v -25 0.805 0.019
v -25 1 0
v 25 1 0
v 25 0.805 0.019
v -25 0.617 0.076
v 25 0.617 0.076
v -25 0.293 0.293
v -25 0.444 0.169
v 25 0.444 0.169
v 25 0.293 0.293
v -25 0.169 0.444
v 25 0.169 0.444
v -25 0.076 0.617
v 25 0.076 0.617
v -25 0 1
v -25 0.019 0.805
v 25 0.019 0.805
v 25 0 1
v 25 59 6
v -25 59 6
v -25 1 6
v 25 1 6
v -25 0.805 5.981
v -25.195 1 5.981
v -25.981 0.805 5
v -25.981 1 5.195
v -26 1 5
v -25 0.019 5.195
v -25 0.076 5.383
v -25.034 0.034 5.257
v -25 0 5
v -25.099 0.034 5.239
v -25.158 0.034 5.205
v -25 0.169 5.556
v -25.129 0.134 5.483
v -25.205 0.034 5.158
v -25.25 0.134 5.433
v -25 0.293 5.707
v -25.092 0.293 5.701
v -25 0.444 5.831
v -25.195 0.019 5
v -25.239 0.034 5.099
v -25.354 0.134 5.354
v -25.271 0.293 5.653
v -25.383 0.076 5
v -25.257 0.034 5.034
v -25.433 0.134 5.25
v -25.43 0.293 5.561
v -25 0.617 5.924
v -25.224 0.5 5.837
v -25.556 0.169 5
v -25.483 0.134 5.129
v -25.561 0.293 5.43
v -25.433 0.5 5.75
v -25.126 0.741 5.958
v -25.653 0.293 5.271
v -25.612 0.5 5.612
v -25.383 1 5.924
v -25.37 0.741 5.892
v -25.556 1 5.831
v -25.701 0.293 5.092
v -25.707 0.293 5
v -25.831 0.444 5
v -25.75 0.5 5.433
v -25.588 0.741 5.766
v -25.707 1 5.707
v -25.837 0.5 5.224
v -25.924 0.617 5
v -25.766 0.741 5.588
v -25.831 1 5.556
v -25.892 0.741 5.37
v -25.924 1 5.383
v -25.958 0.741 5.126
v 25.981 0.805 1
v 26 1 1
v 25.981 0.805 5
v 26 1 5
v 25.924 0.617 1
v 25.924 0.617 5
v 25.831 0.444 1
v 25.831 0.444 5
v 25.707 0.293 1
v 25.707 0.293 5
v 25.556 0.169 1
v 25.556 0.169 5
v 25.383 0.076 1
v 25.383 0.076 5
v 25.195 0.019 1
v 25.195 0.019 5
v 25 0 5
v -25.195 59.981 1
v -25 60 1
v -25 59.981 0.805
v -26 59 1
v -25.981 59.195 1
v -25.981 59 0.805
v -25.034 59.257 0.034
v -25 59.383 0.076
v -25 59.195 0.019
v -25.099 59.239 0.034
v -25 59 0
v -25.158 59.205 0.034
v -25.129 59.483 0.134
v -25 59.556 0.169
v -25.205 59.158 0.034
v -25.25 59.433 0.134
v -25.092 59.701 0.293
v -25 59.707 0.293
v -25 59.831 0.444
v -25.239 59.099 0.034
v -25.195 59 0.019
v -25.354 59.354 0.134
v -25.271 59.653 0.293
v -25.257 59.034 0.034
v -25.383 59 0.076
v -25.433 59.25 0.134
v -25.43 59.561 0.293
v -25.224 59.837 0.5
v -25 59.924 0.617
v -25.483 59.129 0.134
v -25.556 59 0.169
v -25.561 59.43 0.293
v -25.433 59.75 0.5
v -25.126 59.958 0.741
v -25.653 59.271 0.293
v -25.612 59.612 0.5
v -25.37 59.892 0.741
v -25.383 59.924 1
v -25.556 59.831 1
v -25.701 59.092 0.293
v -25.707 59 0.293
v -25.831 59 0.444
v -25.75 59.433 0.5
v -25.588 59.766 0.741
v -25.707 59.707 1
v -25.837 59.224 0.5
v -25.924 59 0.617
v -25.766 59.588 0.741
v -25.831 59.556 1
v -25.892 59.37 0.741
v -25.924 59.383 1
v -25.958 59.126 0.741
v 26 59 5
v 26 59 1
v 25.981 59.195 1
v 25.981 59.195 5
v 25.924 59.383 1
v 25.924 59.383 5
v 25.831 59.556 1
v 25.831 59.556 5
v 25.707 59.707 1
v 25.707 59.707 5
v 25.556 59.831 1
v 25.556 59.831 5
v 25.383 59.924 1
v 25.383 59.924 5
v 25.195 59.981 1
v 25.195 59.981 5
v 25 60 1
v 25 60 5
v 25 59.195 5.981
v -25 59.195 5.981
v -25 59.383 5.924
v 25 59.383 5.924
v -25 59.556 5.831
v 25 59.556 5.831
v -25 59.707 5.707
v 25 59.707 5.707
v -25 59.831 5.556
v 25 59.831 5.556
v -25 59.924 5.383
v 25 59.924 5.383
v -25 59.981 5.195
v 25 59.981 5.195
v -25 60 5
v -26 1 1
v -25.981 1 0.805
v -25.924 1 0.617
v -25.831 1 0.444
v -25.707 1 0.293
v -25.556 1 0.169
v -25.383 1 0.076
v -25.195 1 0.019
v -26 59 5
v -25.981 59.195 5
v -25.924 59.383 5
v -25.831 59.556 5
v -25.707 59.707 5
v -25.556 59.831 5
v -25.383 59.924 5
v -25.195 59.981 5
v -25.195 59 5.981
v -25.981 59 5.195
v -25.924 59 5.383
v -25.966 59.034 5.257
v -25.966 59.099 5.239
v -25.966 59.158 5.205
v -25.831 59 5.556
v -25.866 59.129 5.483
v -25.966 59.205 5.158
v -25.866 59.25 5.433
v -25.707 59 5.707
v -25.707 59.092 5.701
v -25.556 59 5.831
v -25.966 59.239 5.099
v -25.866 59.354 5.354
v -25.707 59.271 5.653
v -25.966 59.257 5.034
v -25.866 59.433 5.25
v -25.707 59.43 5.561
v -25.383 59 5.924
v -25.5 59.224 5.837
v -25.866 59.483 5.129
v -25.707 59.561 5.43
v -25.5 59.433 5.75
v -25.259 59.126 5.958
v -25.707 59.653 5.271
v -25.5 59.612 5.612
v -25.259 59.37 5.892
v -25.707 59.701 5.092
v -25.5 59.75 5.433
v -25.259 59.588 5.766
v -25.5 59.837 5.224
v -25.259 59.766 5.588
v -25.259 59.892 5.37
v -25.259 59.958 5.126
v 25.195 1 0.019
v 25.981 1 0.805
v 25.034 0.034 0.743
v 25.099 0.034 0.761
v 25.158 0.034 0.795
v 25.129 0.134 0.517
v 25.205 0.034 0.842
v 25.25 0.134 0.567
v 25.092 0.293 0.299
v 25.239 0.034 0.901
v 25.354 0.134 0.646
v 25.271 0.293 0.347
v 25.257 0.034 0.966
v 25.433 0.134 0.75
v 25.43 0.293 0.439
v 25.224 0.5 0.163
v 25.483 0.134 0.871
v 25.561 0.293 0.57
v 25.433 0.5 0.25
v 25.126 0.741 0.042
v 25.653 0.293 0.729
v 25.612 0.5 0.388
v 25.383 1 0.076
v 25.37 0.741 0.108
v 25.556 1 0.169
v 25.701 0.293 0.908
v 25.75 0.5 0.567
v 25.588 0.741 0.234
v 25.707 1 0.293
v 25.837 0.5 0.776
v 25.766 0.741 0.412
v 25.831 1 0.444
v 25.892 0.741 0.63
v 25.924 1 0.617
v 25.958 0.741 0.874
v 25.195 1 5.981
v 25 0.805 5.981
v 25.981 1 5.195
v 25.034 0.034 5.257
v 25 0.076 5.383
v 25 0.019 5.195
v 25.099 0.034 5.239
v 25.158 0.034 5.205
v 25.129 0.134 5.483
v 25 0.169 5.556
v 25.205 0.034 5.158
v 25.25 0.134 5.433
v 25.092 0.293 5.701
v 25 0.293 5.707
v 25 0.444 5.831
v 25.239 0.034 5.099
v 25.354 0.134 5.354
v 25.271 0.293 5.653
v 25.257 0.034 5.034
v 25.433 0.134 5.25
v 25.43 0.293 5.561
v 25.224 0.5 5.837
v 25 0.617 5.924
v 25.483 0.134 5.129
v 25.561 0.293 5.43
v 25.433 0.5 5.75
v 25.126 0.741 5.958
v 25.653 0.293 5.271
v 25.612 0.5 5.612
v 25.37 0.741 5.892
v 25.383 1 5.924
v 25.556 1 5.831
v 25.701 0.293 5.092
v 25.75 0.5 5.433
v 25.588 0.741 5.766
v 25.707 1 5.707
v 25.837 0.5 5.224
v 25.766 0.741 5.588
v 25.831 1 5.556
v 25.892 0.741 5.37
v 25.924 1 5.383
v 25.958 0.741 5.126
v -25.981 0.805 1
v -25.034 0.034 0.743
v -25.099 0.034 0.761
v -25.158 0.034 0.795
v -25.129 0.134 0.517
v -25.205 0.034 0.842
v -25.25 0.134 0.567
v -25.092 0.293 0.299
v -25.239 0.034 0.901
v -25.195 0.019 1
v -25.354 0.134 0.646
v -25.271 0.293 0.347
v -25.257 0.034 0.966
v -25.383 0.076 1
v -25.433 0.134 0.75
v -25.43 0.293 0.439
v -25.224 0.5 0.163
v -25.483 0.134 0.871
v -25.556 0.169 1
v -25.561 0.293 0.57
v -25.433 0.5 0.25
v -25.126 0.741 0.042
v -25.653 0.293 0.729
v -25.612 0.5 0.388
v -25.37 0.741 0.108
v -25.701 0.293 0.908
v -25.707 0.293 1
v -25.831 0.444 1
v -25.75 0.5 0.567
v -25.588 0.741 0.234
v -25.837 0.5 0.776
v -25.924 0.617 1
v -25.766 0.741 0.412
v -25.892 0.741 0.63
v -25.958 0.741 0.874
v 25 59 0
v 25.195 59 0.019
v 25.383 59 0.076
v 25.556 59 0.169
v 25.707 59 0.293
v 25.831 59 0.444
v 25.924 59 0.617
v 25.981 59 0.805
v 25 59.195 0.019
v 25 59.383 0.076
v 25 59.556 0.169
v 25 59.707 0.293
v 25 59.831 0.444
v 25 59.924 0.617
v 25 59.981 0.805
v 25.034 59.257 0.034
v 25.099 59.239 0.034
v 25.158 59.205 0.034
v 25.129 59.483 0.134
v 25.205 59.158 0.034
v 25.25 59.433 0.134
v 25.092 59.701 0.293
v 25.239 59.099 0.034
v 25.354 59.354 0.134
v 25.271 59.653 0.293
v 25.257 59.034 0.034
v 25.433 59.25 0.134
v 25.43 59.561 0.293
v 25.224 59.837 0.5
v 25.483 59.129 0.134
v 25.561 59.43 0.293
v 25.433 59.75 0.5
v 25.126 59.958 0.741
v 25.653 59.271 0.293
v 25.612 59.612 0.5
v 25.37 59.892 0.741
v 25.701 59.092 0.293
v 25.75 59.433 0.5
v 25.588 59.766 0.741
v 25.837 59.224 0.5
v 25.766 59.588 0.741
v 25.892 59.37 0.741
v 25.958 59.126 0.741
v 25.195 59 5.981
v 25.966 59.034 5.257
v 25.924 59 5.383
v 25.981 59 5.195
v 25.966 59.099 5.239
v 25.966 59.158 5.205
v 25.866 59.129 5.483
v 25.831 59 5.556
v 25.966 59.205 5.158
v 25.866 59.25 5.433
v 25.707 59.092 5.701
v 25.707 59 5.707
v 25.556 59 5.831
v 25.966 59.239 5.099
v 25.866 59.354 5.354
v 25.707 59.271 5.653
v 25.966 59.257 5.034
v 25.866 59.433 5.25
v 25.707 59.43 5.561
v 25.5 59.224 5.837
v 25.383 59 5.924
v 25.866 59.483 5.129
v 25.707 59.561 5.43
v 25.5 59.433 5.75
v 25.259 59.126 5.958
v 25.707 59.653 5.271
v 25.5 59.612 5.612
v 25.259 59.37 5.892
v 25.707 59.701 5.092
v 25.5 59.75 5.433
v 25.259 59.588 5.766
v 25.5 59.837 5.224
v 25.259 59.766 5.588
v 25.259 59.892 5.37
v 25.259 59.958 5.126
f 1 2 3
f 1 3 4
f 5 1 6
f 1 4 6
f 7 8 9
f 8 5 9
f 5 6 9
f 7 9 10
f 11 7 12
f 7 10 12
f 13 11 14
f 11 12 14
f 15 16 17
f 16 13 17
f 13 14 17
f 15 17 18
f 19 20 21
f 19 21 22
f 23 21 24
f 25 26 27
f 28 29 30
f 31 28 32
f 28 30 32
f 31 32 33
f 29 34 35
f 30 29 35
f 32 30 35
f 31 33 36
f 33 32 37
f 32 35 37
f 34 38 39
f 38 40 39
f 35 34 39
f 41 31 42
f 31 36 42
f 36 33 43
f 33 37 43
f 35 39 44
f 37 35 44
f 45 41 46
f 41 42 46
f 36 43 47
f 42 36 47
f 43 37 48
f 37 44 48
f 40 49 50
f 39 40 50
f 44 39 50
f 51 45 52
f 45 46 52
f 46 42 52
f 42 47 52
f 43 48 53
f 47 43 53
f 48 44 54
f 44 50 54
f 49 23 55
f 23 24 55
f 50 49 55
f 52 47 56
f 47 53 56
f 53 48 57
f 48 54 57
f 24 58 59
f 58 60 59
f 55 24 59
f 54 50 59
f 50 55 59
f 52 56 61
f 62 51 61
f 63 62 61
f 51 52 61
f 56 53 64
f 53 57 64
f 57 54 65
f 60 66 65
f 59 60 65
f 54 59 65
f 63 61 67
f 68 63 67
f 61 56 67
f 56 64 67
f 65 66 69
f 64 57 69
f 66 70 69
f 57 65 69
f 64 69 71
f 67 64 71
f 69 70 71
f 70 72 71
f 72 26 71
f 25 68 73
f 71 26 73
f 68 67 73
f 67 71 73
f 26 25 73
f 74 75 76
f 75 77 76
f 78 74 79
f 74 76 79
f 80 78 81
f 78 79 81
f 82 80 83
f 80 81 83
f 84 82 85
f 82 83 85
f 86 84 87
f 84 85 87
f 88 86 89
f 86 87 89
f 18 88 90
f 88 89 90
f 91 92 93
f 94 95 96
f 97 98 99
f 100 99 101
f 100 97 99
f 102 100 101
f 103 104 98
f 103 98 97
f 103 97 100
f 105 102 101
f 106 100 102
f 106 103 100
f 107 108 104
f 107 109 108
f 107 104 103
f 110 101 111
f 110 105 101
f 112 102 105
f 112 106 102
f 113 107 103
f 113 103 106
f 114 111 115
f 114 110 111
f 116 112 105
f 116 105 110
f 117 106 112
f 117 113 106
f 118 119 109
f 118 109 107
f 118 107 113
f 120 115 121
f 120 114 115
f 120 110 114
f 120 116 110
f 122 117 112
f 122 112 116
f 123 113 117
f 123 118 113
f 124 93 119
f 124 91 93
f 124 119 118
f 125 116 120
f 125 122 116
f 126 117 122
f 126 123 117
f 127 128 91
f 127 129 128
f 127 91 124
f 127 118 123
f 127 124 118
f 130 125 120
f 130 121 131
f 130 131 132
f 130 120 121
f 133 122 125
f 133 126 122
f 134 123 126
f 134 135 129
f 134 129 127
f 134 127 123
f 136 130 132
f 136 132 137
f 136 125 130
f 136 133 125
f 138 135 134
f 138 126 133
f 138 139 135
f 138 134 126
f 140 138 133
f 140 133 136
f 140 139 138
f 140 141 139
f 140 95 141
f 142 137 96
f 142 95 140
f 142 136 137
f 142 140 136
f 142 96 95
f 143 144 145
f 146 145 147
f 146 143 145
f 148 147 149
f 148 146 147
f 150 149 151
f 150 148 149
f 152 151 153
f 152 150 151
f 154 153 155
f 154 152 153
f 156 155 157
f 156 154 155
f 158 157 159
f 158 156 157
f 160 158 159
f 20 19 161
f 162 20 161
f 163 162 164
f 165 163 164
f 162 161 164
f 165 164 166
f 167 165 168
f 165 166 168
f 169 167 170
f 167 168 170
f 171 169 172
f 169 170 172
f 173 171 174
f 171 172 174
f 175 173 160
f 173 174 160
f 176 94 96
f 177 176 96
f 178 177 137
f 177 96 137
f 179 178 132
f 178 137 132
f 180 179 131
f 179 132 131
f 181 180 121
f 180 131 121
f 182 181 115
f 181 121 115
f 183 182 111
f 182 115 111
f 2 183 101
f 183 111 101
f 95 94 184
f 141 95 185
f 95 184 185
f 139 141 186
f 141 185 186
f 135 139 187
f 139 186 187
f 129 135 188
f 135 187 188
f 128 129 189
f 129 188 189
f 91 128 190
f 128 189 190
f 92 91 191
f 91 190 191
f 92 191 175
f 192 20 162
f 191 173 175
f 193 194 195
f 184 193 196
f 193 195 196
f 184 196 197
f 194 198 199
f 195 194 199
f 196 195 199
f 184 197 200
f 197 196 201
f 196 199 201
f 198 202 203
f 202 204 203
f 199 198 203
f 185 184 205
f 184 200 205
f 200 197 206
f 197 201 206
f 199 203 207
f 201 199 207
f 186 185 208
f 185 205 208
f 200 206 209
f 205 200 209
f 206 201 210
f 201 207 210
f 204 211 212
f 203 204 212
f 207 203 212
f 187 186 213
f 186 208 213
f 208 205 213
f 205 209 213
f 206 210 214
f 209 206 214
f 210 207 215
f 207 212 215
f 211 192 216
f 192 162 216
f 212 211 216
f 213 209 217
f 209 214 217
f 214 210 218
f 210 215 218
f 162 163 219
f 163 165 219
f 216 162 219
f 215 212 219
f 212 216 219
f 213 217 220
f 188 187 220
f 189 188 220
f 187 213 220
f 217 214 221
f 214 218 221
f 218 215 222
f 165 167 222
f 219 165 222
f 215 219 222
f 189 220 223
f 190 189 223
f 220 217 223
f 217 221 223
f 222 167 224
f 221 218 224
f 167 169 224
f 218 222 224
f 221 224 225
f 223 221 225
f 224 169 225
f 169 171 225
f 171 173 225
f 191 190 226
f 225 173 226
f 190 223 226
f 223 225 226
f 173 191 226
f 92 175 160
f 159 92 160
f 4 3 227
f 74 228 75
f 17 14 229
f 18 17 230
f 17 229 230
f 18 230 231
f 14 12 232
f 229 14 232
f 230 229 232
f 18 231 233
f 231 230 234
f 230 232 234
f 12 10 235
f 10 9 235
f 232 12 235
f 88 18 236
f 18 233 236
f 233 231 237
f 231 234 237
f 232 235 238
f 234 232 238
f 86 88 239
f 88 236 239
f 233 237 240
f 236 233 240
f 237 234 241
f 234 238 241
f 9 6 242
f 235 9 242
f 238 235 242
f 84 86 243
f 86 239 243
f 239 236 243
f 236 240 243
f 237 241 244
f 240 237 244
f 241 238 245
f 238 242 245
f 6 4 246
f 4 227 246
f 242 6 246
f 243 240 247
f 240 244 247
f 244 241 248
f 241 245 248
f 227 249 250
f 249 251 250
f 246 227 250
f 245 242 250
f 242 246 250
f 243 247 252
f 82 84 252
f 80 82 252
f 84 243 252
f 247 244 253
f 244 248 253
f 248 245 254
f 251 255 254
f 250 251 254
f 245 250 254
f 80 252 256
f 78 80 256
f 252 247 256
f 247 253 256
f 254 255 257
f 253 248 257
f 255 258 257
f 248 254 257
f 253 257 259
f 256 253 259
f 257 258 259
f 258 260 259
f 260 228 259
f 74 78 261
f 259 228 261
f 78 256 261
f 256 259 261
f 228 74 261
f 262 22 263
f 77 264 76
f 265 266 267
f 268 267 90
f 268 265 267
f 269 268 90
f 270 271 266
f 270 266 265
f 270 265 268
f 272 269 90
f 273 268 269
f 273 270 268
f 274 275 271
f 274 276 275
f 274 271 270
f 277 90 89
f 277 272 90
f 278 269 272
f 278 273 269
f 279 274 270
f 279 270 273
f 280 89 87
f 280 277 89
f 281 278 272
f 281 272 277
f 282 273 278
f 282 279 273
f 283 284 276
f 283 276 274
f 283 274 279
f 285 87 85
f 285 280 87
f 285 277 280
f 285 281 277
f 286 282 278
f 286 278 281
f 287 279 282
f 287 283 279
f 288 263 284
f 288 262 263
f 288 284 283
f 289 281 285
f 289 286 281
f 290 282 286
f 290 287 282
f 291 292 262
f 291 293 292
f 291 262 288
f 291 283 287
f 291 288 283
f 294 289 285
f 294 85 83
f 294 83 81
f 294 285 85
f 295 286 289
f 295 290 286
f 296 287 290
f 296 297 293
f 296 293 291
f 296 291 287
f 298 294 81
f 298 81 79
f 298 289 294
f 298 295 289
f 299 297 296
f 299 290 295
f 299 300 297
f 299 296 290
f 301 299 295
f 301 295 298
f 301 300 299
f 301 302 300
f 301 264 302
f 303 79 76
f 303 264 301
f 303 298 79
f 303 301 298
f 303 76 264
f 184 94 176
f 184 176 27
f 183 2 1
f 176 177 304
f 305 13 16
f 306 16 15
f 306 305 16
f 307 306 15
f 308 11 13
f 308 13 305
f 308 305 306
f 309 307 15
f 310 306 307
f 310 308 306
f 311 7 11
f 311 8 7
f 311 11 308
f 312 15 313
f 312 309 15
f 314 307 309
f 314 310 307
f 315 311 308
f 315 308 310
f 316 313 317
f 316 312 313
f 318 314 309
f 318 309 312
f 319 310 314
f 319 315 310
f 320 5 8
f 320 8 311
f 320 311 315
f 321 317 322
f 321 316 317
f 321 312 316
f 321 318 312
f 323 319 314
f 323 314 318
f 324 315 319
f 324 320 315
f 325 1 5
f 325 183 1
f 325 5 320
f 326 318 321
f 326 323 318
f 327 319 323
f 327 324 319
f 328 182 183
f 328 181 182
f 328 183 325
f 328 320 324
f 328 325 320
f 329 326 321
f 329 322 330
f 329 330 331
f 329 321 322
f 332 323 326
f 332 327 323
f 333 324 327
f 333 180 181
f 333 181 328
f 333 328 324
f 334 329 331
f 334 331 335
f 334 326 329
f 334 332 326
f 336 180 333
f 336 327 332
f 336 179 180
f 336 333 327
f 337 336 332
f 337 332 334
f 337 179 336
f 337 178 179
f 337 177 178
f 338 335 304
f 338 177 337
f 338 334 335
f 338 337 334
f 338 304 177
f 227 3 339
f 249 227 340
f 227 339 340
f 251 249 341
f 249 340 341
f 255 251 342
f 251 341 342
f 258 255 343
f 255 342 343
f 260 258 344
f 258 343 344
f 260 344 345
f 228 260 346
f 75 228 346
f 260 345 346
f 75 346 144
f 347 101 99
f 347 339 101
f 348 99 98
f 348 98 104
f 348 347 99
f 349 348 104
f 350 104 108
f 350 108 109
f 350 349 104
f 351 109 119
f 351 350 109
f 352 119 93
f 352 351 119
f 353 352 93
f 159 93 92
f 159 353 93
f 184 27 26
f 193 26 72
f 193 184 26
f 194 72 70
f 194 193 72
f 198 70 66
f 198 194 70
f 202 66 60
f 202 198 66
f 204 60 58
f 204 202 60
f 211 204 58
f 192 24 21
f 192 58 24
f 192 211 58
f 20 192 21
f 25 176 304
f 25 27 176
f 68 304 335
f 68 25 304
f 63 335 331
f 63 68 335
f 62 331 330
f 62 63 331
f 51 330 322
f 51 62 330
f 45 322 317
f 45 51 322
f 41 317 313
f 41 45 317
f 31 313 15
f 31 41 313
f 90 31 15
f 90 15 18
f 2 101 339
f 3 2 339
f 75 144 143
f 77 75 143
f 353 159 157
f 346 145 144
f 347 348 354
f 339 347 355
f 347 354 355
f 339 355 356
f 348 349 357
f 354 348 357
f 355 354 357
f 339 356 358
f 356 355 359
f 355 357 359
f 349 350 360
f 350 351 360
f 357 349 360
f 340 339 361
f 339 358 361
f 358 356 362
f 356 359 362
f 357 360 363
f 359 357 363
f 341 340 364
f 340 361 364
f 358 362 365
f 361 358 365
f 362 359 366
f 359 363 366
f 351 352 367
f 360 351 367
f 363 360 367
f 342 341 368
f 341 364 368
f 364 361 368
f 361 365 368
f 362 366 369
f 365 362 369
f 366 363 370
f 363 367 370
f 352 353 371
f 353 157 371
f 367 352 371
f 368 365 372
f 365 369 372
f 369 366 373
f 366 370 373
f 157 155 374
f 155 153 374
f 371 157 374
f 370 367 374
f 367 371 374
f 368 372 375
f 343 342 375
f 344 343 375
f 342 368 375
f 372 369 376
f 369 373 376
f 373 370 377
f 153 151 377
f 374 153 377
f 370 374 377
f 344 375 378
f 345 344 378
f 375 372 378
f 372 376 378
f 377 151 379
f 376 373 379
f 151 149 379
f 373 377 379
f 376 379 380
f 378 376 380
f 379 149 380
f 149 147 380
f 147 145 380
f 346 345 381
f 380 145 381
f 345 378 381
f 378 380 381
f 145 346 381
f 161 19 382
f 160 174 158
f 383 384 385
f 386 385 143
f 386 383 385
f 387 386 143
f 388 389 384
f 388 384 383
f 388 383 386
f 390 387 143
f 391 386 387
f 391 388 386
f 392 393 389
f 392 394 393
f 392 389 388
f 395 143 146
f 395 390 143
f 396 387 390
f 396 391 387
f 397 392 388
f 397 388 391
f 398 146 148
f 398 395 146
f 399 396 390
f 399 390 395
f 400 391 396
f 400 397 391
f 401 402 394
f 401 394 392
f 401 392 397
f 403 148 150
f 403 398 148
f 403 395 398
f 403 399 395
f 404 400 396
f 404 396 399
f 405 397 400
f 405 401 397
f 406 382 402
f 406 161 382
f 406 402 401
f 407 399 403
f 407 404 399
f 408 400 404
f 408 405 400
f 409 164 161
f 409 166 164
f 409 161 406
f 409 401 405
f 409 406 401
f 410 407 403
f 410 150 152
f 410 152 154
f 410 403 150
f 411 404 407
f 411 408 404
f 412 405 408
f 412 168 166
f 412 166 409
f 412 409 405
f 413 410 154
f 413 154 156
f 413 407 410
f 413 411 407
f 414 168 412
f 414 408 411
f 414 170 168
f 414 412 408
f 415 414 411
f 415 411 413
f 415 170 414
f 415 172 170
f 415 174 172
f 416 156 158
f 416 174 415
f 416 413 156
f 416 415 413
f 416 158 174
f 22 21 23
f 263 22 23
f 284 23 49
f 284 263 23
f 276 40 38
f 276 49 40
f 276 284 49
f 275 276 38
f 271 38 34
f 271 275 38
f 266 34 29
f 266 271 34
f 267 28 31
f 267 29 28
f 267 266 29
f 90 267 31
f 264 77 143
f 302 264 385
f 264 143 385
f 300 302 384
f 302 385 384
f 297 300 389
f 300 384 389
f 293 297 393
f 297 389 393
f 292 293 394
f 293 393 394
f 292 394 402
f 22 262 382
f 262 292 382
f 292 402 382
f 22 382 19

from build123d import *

# Parameters (mm, degrees)
F0_W     = 52
F0_H     = 6
F1_DEPTH = 60
F2_R     = 1


# Not quite as in the source:
# - a feature names something its author has since deleted; it is built from what else it names


with BuildPart() as f1:
    # F0 (on Front) → F1 (new body)
    with BuildSketch(Plane.XZ):
        with Locations((0, 3)):
            Rectangle(F0_W, F0_H)
    extrude(amount=-F1_DEPTH)

    # F2
    f2_edges = [f1.edges().sort_by_distance(p)[0] for p in [
        (0, 60, 6),
        (26, 30, 6),
        (-26, 30, 6),
        (0, 0, 6),
        (26, 60, 3),
        (-26, 60, 3),
        (0, 60, 0),
        (-26, 30, 0),
        (26, 30, 0),
        (0, 0, 0),
        (-26, 0, 3),
        (26, 0, 3),
    ]]
    fillet(f2_edges, radius=F2_R)


solid = f1.part
